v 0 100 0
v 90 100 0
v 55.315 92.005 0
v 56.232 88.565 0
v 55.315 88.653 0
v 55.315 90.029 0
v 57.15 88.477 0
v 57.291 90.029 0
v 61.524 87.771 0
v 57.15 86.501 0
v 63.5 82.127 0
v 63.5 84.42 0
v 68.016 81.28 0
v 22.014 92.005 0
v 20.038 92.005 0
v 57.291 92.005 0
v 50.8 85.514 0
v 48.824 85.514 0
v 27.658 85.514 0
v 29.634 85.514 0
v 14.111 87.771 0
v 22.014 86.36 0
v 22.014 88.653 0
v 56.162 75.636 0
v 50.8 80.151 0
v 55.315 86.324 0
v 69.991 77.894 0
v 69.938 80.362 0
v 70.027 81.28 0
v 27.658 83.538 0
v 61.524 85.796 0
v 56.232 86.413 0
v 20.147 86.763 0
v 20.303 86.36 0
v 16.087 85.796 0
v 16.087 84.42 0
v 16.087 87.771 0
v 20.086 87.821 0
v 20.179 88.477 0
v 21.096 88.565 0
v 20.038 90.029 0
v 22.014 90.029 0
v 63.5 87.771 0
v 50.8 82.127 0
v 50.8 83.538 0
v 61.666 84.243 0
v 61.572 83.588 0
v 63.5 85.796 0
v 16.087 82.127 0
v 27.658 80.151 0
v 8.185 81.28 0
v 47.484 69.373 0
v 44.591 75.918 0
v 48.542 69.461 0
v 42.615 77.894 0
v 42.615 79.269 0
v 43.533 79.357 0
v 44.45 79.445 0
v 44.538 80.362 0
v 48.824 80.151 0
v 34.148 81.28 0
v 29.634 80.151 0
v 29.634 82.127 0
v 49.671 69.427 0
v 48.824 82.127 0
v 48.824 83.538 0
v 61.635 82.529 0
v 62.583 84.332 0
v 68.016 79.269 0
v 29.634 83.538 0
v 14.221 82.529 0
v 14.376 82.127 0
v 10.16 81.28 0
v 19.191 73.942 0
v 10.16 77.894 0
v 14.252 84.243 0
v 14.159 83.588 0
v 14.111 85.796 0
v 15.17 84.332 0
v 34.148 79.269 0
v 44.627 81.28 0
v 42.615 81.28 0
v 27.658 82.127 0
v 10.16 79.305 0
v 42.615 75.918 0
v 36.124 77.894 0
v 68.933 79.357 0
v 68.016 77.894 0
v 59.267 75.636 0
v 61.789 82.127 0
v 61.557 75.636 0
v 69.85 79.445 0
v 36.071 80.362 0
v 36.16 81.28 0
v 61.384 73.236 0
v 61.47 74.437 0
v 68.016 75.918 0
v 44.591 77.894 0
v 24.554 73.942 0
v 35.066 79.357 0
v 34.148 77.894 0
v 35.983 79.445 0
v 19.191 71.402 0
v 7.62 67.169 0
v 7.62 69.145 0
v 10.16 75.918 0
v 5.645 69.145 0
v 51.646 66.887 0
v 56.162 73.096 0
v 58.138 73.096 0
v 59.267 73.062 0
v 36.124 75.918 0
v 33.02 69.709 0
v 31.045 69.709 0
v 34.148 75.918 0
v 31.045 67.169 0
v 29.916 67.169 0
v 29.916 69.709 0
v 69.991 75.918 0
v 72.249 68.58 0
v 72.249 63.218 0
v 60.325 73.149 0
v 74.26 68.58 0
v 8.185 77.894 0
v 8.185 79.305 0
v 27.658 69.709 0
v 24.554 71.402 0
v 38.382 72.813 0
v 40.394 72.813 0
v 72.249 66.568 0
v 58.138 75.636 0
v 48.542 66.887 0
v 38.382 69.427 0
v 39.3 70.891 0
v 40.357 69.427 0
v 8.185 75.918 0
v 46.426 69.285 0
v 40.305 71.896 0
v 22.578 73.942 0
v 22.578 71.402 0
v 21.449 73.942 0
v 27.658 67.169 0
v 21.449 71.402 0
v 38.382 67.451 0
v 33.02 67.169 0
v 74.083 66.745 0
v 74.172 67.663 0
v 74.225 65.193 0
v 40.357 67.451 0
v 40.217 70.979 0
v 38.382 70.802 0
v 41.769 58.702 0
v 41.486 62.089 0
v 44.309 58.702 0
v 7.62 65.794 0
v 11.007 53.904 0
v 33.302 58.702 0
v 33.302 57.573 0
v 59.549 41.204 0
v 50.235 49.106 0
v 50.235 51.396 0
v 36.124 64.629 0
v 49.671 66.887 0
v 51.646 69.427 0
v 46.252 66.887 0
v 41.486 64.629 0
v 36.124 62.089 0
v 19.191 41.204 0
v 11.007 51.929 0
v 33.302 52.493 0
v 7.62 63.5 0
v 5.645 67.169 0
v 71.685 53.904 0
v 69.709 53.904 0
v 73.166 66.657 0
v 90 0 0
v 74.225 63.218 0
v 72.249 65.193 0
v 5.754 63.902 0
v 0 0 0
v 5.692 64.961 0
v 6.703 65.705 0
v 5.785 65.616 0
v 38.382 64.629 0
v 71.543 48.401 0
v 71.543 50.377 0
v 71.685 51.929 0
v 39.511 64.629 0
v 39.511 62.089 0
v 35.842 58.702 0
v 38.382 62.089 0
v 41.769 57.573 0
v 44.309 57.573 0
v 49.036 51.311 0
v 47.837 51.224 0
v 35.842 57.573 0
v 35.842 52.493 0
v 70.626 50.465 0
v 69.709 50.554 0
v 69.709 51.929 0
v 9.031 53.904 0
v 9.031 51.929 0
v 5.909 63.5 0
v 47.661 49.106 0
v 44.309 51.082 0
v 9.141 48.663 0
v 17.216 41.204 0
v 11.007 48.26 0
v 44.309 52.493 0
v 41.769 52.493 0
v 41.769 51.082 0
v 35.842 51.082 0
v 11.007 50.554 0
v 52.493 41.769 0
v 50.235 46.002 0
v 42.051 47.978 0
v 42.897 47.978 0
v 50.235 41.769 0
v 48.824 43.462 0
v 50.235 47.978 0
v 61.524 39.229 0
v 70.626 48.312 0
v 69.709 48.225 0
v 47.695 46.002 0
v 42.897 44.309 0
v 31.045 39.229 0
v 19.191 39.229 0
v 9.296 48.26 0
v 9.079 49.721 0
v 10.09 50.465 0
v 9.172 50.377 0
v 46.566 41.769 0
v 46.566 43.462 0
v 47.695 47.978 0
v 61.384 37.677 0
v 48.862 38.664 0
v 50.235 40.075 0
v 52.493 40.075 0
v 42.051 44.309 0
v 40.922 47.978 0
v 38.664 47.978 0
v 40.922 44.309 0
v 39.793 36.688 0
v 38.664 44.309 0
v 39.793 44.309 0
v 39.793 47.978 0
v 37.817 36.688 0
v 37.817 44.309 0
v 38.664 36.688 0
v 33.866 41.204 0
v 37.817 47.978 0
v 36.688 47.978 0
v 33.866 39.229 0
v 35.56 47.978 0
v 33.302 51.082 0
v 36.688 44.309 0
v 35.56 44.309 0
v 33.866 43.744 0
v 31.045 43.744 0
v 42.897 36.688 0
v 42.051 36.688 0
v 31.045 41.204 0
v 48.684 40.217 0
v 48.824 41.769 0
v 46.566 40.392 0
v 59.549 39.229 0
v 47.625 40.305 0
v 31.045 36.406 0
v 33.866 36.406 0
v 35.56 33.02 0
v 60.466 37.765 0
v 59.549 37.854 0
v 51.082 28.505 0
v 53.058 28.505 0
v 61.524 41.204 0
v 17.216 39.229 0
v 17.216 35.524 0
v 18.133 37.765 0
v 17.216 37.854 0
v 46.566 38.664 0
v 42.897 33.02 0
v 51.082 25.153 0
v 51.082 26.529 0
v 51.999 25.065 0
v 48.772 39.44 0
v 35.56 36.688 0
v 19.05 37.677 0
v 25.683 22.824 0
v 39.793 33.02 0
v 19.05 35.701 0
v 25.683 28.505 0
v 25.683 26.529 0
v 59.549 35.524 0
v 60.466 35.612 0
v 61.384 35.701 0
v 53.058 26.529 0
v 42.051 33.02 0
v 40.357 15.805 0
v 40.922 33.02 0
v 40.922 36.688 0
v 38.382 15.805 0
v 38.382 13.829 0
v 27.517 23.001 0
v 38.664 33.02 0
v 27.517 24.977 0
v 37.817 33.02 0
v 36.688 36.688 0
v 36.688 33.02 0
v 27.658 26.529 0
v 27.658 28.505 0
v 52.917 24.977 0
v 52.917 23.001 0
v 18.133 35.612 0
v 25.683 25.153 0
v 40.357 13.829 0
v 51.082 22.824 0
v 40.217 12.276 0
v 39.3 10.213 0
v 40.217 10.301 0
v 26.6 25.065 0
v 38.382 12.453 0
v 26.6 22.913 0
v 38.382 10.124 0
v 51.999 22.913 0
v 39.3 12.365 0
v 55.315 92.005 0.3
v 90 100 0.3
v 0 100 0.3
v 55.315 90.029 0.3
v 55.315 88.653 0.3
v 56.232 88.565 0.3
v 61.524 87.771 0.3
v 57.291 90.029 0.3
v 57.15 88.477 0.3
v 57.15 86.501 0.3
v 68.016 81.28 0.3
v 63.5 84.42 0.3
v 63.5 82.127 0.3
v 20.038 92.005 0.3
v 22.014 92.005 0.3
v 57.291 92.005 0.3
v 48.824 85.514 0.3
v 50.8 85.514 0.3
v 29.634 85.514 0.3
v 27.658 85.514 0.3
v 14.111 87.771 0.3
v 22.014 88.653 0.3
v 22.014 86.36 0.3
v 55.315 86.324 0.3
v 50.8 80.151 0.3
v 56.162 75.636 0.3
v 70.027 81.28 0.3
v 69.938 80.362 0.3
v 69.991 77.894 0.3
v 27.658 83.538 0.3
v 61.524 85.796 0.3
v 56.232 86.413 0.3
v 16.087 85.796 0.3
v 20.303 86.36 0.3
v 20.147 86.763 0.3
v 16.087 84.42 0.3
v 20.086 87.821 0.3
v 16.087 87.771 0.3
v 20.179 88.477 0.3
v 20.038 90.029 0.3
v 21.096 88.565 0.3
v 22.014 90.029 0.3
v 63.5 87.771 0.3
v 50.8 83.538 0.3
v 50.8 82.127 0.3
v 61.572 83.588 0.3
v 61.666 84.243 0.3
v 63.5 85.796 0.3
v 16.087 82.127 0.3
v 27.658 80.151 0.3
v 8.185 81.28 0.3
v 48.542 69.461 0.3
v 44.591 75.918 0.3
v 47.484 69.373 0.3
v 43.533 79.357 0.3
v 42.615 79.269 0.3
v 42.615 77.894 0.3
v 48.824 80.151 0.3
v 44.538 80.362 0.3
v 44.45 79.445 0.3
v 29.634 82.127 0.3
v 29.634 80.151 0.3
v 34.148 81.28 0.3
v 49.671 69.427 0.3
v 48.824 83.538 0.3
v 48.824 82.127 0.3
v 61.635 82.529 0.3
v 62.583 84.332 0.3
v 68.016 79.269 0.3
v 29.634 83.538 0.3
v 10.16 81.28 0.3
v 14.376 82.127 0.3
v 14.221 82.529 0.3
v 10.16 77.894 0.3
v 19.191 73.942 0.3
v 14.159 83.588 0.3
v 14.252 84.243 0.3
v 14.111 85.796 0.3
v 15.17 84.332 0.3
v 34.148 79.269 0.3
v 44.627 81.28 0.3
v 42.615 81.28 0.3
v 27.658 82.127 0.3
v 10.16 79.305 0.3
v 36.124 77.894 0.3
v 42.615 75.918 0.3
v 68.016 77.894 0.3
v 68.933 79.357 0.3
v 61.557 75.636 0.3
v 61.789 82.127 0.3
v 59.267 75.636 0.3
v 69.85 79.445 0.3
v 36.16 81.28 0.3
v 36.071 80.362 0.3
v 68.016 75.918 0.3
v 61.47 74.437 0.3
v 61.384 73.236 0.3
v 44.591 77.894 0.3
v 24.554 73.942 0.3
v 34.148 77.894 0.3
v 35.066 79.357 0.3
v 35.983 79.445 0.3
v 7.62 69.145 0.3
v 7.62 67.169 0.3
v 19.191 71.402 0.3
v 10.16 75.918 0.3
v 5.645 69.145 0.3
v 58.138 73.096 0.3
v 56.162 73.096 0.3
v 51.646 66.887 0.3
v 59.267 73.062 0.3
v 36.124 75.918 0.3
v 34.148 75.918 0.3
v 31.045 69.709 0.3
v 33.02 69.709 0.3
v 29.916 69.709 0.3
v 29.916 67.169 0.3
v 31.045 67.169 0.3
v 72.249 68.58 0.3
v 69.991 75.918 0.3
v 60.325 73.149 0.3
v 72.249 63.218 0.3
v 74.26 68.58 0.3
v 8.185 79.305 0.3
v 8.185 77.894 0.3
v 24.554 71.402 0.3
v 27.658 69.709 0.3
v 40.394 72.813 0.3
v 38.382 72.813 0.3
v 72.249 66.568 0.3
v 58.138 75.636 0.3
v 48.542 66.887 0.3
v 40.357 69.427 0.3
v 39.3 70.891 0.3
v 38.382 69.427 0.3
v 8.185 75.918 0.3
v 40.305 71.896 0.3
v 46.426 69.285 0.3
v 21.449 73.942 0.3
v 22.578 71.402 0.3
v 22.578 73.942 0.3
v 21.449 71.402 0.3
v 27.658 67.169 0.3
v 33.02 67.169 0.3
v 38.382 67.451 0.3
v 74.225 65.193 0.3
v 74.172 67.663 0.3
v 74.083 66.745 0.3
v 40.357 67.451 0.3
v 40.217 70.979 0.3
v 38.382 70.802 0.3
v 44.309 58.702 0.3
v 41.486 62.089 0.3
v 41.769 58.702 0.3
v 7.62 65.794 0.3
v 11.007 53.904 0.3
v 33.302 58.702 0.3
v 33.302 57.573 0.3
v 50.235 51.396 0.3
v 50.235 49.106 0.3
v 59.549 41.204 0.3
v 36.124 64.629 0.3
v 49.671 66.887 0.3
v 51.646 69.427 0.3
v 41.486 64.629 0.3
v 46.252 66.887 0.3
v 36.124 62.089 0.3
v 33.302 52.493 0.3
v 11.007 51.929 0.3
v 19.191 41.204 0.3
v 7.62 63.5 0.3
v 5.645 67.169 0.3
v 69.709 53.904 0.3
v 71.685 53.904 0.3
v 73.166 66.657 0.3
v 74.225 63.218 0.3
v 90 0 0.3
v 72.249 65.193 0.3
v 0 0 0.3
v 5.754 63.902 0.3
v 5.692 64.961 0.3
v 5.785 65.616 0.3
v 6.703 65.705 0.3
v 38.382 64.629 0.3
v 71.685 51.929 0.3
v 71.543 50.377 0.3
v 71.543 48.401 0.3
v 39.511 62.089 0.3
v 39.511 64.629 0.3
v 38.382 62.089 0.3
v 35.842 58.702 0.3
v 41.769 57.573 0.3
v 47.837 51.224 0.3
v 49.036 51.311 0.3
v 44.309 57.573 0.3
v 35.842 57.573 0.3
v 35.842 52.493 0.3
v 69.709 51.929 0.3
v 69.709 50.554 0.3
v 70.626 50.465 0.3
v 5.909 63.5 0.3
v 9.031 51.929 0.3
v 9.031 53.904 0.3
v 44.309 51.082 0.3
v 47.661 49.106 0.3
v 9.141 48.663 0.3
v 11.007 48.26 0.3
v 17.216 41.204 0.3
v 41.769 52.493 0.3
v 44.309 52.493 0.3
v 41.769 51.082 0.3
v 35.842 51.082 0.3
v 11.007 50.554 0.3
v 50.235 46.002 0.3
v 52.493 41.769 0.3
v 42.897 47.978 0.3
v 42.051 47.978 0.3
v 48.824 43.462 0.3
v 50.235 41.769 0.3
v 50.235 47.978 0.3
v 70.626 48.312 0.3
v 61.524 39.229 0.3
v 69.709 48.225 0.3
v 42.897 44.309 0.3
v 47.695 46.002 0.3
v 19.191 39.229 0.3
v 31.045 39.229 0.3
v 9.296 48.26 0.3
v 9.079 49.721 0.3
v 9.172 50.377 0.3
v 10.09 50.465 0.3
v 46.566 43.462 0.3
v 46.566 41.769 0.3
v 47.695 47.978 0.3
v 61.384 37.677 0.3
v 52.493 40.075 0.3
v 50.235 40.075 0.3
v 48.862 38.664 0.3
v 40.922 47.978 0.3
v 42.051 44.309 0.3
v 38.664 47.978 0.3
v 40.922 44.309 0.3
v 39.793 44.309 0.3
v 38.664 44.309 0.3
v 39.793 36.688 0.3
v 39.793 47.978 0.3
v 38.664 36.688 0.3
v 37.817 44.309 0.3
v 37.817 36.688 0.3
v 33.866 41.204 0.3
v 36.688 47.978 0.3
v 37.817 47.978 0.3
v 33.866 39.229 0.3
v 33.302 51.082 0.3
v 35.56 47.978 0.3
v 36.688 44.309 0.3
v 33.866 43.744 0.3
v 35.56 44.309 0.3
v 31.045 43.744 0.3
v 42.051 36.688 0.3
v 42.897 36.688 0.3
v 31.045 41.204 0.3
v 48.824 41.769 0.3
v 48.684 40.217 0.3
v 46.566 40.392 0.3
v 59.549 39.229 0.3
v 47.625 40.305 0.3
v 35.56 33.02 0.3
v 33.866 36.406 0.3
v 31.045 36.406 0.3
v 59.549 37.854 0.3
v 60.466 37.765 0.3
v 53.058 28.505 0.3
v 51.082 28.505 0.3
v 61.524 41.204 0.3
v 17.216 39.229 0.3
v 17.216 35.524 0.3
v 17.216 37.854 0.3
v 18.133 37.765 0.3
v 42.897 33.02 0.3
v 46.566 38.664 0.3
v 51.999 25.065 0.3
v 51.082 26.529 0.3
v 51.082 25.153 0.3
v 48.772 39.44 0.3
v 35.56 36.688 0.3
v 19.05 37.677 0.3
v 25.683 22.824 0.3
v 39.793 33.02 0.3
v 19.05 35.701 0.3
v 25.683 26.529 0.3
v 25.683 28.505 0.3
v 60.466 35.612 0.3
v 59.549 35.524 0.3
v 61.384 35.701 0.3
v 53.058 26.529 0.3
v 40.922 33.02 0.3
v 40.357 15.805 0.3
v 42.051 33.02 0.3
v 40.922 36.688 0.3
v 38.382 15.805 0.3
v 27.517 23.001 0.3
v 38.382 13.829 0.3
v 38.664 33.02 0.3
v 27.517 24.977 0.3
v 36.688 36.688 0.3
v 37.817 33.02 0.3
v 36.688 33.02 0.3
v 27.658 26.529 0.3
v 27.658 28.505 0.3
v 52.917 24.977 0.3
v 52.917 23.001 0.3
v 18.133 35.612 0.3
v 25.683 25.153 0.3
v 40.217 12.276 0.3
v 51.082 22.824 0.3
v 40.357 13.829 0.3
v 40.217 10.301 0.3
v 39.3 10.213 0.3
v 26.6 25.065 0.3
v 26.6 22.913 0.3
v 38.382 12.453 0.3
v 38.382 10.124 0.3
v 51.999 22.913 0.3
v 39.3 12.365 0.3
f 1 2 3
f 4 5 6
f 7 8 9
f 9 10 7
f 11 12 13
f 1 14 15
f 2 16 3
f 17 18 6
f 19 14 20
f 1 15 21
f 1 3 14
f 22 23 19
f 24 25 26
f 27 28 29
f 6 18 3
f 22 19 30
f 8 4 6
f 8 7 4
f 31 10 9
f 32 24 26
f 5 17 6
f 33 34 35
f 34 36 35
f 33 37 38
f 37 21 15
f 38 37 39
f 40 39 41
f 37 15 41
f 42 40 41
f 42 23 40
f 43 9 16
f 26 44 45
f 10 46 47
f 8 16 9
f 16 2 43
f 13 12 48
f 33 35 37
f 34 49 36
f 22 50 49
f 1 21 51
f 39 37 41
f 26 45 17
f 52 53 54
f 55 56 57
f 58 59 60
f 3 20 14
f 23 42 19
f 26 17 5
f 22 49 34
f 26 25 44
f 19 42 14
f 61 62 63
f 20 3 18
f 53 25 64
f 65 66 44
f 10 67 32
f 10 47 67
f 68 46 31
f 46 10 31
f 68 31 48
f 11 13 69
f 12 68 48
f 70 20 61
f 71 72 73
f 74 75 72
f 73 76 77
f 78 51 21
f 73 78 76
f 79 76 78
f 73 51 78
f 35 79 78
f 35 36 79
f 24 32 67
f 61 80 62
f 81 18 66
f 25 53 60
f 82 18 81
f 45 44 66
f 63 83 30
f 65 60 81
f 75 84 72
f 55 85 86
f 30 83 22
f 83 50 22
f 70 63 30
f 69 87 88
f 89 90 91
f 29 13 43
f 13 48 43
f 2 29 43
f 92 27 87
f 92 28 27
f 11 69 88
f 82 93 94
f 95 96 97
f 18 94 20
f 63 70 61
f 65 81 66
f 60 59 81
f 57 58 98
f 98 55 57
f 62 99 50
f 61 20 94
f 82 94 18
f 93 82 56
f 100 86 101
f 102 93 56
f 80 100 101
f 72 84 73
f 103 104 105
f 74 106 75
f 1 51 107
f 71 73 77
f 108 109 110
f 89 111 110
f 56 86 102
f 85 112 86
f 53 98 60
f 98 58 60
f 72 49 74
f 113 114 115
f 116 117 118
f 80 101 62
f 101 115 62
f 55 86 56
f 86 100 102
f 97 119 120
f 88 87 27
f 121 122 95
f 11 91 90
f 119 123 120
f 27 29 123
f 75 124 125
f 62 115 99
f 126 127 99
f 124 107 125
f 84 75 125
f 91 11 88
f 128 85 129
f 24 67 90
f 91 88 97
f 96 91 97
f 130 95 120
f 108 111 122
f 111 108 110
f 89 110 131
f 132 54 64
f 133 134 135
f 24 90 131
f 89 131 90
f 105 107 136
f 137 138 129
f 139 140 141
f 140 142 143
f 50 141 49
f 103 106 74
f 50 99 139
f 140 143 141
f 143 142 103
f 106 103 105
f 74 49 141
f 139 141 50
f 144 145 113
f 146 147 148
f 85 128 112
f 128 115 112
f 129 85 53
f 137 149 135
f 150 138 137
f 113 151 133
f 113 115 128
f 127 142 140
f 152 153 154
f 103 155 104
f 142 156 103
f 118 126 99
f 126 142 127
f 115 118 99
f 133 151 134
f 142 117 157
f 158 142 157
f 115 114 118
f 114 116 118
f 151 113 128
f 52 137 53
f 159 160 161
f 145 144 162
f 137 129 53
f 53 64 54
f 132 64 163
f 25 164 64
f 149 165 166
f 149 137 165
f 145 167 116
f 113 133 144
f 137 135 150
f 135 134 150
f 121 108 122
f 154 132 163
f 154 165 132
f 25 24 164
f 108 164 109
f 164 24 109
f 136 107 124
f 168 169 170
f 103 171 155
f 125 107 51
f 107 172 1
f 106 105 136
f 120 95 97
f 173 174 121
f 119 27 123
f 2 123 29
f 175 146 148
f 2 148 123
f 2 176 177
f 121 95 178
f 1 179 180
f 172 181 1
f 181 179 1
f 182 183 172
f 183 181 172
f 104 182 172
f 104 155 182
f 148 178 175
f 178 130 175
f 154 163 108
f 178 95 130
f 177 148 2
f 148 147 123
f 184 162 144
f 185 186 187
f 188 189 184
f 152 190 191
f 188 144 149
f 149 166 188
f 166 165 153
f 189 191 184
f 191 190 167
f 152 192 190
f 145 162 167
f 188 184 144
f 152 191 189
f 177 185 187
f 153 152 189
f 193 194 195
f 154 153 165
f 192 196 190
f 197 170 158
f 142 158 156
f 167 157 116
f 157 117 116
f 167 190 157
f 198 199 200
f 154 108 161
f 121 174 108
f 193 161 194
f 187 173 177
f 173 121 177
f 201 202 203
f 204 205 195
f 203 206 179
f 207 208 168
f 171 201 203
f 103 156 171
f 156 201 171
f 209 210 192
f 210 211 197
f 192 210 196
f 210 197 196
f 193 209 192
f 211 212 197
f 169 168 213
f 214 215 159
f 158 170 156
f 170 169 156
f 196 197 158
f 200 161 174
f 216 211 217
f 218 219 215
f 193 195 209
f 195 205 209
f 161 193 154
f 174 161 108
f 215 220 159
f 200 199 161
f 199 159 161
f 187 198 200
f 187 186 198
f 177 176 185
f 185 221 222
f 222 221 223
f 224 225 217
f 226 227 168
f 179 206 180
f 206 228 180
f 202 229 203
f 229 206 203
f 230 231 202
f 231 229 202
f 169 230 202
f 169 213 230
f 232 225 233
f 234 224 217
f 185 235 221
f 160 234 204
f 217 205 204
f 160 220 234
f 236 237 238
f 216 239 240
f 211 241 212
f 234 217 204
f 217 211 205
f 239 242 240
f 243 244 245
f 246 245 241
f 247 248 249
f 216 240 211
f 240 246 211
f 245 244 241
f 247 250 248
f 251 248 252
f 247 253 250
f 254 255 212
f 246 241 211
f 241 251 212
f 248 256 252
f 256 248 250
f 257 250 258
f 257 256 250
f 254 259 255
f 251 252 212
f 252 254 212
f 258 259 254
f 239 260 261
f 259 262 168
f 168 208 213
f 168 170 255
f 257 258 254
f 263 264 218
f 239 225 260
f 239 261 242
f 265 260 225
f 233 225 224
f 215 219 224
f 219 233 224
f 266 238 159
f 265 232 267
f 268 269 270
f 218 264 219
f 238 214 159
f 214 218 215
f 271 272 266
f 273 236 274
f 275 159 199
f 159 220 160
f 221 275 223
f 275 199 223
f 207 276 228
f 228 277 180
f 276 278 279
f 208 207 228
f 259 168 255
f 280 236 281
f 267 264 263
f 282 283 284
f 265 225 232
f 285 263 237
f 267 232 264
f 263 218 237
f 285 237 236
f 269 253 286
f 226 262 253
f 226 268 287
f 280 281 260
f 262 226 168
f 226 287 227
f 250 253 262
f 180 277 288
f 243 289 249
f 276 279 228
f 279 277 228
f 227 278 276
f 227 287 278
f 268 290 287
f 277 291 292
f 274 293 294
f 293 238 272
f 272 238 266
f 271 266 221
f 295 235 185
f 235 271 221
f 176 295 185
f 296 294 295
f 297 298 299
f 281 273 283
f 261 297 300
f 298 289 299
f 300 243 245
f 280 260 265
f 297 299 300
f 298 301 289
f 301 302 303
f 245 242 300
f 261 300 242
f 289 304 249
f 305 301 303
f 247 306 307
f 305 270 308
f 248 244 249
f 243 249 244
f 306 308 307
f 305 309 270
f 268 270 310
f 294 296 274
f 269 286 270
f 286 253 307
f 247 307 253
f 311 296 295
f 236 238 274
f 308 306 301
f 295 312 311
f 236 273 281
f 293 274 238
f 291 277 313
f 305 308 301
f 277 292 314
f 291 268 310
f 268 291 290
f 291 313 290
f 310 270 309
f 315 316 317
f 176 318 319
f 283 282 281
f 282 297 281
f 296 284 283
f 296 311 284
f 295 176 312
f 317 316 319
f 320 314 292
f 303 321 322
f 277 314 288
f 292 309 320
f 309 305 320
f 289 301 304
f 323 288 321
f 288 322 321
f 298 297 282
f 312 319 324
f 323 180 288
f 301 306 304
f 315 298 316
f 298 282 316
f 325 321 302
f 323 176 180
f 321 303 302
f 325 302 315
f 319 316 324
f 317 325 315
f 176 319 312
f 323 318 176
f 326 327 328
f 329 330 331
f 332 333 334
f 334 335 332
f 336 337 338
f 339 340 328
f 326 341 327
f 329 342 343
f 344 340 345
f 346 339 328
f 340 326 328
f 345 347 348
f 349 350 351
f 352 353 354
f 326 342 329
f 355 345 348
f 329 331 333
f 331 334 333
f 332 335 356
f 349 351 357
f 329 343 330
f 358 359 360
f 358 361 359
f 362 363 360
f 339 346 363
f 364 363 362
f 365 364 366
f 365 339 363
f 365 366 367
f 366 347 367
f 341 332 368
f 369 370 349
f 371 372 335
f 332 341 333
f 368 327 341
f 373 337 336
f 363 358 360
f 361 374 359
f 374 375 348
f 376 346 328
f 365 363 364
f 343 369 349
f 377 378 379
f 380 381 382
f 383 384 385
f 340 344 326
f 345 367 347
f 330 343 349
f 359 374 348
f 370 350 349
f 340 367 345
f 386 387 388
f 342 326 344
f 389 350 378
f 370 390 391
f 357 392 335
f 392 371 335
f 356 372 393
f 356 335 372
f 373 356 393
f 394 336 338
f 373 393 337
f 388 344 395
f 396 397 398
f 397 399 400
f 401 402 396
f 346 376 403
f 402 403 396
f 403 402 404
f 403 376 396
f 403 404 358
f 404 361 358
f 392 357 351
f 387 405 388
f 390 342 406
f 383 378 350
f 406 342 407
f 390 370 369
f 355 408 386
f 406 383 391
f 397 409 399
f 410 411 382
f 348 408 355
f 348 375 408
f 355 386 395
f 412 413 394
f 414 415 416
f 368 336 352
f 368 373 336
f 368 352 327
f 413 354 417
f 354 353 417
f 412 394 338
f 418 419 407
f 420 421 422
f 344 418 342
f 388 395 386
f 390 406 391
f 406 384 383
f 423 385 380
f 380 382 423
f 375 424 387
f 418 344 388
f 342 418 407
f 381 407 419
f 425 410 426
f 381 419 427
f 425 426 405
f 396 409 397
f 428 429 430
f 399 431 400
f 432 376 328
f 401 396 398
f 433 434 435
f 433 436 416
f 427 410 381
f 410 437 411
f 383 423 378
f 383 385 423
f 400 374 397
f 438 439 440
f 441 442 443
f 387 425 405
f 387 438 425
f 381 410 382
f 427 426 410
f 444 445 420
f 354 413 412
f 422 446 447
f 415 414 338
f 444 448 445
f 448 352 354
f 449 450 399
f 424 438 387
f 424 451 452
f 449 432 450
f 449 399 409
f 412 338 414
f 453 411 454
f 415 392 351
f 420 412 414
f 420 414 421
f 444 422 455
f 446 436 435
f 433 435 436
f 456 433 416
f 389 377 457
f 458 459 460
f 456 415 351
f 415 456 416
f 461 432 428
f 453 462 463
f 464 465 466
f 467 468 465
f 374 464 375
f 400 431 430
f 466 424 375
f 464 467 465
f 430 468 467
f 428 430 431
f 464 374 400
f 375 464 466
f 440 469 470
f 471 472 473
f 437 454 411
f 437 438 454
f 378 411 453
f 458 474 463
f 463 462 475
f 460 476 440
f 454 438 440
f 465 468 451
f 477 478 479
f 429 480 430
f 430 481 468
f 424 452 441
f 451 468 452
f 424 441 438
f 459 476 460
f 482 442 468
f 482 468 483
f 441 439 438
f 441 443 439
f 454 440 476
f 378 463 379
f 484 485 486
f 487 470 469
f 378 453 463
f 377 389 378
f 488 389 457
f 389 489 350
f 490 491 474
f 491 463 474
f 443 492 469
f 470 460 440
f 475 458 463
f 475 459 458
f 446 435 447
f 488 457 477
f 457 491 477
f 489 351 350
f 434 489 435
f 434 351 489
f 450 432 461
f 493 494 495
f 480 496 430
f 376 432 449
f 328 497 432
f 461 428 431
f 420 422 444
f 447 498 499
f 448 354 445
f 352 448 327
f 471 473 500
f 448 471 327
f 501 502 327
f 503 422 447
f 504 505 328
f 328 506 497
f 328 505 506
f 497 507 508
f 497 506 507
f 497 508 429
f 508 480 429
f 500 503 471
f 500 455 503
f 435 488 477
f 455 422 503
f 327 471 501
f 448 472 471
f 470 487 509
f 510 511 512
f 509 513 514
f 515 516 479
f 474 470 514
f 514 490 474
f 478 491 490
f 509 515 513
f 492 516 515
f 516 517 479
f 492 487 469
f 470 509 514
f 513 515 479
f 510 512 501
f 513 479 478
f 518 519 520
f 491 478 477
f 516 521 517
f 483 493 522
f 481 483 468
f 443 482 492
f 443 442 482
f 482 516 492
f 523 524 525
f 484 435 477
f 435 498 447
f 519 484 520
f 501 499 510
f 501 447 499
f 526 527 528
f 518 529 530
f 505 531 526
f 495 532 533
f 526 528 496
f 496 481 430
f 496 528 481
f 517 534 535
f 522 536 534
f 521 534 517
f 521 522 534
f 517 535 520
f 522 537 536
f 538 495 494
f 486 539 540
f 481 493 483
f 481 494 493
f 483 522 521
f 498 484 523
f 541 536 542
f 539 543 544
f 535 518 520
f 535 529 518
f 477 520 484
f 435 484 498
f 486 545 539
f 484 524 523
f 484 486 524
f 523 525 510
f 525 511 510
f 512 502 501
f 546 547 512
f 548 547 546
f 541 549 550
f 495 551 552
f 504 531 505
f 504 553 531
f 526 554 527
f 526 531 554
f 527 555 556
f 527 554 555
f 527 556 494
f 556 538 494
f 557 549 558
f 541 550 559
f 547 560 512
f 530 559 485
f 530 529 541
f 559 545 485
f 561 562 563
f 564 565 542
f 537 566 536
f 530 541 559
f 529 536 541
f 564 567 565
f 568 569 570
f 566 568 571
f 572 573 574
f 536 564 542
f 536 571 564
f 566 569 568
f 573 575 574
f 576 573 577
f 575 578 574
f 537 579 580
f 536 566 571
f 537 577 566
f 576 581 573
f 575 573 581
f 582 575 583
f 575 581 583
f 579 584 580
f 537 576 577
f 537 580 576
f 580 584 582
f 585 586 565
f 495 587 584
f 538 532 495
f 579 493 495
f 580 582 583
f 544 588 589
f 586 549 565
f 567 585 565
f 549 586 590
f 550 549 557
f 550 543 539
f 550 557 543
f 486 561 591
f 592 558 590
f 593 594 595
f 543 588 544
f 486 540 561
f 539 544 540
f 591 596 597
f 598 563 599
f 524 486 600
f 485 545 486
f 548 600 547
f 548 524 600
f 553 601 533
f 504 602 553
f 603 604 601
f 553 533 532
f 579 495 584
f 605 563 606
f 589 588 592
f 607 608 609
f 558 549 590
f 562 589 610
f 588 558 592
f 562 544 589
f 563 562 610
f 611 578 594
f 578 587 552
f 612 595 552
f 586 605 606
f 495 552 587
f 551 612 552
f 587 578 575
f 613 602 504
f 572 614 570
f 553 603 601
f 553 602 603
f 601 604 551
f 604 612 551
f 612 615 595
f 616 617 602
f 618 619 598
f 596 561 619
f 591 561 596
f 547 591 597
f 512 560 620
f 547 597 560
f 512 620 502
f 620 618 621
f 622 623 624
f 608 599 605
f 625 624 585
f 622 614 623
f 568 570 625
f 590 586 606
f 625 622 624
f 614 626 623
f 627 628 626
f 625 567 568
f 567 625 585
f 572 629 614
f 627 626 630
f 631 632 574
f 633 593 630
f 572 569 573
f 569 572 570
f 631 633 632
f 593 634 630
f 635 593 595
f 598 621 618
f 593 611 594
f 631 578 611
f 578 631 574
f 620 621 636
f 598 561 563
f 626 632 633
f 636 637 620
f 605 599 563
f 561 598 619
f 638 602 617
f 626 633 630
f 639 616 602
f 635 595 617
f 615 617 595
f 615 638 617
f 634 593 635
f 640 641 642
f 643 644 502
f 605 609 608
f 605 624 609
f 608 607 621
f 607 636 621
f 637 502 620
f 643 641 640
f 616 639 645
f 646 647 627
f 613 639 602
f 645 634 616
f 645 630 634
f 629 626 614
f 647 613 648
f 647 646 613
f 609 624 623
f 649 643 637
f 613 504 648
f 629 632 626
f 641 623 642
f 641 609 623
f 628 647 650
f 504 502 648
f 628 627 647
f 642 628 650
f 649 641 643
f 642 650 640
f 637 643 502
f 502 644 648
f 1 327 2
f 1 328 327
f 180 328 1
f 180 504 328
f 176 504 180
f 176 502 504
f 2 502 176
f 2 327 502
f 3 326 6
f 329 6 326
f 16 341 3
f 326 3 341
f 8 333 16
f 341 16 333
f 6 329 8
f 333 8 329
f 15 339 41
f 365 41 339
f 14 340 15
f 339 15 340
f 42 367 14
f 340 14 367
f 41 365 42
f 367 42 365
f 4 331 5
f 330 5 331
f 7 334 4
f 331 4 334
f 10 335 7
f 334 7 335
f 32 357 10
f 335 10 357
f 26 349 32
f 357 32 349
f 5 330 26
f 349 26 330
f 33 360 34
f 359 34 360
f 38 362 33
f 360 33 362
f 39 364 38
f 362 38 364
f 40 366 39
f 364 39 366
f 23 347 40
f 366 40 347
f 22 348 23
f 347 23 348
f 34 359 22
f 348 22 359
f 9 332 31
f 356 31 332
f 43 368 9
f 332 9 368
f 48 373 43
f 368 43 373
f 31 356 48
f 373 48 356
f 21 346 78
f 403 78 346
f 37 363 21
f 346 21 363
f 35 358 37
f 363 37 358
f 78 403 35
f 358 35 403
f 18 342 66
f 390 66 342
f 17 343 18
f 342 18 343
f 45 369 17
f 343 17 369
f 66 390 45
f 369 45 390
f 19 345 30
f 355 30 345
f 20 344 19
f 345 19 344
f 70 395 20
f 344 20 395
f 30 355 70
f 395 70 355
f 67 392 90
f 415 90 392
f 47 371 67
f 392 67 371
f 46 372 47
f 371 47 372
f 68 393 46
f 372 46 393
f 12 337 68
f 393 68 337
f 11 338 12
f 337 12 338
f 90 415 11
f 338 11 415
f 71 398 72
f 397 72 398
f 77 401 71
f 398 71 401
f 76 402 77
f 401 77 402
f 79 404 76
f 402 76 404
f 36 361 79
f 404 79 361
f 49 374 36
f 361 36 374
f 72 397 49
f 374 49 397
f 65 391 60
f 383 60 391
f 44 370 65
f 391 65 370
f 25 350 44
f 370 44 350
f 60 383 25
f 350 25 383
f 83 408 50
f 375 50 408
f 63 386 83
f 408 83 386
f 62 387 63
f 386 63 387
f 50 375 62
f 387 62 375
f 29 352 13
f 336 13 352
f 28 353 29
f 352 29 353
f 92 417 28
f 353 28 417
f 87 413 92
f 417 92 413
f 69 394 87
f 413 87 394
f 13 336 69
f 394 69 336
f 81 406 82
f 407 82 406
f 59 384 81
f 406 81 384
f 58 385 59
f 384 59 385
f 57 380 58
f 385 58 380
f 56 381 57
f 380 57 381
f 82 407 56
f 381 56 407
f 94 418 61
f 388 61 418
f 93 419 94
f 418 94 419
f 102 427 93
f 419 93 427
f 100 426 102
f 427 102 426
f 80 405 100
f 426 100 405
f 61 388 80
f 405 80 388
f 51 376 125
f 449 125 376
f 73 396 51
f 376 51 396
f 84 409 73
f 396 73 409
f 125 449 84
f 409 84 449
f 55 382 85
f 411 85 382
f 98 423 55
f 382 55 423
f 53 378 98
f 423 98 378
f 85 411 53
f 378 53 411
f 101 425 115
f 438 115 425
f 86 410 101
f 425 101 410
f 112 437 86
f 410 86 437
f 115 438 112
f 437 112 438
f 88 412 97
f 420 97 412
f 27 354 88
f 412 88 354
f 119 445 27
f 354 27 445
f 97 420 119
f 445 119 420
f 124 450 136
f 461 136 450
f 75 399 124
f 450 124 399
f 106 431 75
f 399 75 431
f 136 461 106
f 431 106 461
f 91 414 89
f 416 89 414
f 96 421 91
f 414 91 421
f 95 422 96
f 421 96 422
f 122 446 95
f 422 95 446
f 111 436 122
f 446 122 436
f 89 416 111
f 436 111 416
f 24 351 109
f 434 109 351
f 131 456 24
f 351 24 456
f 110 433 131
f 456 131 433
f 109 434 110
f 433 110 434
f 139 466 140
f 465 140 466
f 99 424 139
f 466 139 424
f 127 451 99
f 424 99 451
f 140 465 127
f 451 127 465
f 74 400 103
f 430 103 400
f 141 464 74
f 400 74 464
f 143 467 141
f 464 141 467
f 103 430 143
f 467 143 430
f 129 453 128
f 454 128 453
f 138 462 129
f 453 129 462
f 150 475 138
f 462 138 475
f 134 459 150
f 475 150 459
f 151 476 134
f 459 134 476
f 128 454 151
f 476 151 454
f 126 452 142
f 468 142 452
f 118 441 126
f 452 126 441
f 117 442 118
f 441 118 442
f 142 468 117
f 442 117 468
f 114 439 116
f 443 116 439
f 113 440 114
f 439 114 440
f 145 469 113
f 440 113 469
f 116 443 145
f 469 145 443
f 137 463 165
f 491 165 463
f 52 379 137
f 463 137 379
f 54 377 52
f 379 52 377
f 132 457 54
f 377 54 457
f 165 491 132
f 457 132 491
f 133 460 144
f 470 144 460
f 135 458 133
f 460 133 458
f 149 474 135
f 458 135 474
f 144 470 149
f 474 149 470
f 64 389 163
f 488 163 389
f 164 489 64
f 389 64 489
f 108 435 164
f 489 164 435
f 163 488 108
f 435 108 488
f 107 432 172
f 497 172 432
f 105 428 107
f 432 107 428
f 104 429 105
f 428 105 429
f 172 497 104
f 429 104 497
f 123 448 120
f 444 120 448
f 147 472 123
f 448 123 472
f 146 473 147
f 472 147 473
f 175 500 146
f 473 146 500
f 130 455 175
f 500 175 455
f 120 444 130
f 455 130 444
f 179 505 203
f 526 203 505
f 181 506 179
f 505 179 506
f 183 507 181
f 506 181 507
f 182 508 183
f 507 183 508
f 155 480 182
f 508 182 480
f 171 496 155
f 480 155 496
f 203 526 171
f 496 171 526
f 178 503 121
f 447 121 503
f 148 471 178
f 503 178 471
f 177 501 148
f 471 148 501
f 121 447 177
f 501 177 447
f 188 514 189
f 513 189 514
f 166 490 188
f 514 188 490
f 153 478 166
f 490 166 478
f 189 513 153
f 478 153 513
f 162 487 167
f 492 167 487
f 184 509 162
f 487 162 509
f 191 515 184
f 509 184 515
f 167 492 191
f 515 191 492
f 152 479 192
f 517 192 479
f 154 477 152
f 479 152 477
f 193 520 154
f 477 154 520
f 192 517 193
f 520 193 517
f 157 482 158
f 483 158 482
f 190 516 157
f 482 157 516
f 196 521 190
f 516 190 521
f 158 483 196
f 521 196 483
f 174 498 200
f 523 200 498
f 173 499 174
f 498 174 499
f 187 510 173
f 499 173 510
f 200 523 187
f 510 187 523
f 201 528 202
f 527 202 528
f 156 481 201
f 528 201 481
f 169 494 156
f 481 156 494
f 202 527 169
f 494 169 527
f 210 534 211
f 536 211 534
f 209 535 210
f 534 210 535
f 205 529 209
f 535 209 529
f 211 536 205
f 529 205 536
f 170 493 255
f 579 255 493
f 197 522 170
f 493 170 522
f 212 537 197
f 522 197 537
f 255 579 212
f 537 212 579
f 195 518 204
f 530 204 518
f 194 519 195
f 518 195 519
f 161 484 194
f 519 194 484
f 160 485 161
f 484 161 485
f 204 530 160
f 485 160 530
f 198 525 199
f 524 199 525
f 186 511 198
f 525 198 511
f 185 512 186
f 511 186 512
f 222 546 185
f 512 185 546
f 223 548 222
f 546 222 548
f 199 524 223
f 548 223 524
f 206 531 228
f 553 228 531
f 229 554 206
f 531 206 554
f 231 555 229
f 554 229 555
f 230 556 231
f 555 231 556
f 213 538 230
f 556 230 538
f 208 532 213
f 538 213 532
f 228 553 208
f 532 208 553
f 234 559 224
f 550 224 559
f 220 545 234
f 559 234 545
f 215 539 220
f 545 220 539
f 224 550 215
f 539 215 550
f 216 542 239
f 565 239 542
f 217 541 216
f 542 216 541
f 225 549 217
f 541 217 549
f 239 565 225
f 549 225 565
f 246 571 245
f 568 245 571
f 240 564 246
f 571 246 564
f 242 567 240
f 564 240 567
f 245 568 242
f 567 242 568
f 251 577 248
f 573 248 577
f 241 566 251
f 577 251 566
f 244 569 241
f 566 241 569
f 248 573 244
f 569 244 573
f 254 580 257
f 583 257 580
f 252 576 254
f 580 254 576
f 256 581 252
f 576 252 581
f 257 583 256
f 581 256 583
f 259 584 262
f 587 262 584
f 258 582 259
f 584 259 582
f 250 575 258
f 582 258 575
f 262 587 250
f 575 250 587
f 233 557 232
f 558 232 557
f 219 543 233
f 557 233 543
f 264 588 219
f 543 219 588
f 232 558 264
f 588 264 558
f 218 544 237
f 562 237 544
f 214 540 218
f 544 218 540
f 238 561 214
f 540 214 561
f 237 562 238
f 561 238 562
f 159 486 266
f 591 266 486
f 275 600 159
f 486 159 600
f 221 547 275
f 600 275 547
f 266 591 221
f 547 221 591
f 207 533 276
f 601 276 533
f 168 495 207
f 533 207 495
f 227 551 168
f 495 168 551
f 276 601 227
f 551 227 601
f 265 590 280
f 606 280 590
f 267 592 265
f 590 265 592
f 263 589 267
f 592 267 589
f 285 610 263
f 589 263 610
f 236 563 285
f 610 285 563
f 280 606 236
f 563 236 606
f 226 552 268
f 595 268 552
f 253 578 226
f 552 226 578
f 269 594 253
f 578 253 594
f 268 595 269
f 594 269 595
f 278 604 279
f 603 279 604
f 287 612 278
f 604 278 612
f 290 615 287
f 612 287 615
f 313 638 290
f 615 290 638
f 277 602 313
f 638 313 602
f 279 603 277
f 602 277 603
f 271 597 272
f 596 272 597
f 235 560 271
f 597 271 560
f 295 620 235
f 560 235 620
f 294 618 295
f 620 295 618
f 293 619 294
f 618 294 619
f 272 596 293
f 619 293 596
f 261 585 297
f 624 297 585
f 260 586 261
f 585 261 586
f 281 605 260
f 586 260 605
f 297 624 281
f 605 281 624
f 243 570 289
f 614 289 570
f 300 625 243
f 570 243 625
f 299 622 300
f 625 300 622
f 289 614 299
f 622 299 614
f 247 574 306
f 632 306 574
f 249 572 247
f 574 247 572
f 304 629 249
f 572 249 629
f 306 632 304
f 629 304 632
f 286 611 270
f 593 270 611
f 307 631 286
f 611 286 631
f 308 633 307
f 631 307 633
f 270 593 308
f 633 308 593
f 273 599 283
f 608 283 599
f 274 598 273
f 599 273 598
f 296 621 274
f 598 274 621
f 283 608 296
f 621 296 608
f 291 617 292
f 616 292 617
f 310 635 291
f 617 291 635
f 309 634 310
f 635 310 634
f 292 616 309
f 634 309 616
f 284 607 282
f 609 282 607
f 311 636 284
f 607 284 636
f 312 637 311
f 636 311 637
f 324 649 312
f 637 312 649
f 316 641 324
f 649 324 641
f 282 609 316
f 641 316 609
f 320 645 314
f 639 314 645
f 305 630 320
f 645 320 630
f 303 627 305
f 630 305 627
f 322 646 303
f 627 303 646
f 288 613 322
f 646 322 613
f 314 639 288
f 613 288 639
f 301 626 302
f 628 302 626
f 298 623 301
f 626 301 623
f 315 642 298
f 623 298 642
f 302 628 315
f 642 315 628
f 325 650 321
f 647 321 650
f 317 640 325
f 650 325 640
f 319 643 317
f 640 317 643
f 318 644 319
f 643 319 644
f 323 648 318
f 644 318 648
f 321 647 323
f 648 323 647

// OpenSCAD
linear_extrude(.3) difference() {
	square([90,100]);
	import ("charlie heart_top_paste.dxf");
}
